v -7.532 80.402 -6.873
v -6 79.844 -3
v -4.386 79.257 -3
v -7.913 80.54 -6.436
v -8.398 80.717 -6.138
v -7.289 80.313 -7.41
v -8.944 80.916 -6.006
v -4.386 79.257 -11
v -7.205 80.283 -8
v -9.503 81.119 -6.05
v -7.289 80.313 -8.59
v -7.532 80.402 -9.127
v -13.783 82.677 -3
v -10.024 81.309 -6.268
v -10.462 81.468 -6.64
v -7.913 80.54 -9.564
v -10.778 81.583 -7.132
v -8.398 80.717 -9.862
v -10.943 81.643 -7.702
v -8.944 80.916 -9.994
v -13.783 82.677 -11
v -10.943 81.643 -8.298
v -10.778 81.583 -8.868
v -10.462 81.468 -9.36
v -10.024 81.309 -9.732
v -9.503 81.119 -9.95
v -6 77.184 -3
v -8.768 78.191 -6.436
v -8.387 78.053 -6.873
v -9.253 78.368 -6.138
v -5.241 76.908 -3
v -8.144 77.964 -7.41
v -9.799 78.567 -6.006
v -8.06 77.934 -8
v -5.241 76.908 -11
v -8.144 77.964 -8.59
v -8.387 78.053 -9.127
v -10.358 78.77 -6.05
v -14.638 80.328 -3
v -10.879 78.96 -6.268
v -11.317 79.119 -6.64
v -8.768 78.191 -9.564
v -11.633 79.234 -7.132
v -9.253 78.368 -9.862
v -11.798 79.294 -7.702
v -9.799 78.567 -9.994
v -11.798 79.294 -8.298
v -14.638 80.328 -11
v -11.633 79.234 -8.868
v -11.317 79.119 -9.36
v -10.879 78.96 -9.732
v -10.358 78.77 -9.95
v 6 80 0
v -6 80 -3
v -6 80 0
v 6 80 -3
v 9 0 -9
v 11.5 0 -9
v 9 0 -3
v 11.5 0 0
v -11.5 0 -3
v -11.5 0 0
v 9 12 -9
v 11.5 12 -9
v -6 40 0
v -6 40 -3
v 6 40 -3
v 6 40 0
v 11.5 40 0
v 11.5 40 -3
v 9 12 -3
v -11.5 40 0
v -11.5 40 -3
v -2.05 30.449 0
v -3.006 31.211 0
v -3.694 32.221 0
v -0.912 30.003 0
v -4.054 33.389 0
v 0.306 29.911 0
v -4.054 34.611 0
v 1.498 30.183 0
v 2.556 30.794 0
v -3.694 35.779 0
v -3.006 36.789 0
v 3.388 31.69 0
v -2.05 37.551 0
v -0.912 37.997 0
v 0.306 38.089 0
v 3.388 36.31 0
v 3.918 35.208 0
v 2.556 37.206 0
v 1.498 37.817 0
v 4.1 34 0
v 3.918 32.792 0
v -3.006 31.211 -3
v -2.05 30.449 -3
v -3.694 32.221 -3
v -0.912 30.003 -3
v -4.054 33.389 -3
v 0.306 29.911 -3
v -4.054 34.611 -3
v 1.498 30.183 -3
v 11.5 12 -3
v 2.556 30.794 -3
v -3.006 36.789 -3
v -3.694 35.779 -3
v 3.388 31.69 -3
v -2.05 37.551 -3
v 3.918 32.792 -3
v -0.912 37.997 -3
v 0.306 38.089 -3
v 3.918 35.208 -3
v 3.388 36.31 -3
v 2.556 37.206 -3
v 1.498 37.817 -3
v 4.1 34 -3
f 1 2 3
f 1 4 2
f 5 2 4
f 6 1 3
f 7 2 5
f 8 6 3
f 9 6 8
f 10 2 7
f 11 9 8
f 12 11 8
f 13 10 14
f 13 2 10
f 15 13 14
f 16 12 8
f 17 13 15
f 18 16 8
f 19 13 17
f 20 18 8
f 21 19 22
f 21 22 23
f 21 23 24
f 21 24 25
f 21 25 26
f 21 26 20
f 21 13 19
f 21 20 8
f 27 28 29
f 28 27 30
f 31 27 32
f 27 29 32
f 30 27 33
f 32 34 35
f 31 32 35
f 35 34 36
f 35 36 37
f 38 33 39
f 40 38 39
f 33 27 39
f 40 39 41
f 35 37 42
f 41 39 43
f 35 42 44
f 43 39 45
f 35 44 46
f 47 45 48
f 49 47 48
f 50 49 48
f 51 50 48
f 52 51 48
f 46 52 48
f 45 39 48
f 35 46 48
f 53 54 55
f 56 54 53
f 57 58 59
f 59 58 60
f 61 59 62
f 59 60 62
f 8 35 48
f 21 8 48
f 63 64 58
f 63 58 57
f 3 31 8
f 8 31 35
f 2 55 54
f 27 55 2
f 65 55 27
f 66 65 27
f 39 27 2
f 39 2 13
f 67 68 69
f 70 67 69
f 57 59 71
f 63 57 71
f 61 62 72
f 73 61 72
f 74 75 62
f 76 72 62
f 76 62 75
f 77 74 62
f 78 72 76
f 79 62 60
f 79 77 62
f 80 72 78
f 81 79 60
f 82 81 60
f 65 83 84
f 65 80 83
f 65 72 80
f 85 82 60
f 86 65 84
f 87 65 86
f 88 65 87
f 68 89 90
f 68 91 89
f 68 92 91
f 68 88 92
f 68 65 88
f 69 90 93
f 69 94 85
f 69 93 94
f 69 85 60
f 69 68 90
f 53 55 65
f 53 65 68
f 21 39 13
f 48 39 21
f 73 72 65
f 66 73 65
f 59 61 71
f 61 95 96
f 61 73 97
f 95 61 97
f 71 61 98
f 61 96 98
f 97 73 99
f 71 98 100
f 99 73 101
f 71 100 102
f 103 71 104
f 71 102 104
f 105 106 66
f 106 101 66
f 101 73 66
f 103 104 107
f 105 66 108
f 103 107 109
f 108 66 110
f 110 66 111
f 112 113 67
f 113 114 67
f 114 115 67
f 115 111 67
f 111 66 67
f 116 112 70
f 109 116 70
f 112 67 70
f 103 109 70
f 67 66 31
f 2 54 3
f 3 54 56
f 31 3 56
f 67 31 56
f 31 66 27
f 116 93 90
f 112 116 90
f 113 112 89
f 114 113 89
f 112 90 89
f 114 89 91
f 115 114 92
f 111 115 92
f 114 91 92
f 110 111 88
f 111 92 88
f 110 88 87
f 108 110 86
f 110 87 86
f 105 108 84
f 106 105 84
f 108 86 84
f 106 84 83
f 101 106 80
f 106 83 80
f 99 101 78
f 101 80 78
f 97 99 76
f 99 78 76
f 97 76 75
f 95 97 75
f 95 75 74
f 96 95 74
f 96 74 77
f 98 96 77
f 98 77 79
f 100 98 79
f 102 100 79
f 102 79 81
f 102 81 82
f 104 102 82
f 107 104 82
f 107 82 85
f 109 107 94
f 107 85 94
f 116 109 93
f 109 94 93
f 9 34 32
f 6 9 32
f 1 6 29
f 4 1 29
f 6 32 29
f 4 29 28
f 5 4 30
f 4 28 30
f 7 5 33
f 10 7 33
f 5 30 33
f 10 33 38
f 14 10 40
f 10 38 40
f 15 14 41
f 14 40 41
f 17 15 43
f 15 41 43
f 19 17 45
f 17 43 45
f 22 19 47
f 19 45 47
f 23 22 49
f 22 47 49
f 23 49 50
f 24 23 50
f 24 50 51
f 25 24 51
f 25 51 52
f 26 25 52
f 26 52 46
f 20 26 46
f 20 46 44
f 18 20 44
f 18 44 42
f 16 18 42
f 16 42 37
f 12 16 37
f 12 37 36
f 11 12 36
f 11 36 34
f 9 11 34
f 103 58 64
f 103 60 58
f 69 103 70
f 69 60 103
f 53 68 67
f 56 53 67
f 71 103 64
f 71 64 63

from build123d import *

# Parameters (mm, degrees)
SKETCH1_W           = 23
SKETCH1_H           = 40
BOSS_EXTRUDE1_DEPTH = 3
SKETCH2_R           = 4.1
CUT_EXTRUDE1_DEPTH  = 3
SKETCH3_W           = 12
SKETCH3_H           = 3
BOSS_EXTRUDE2_DEPTH = 40
SKETCH4_W           = 2.5
SKETCH4_H           = 12
BOSS_EXTRUDE3_DEPTH = 6
SKETCH6_W           = 8
SKETCH6_H           = 10
BOSS_EXTRUDE4_DEPTH = 2.5
SKETCH7_R           = 2
CUT_EXTRUDE2_DEPTH  = 78.511007161


with BuildPart() as part:
    # Sketch1 → Boss-Extrude1 (new body)
    with BuildSketch(Plane.XY):
        with Locations((0, 20)):
            Rectangle(SKETCH1_W, SKETCH1_H)
    extrude(amount=-BOSS_EXTRUDE1_DEPTH)

    # Sketch2 → Cut-Extrude1 (cut)
    with BuildSketch(Plane.XY):
        with Locations((0, 34)):
            Circle(SKETCH2_R)
    extrude(amount=-CUT_EXTRUDE1_DEPTH, mode=Mode.SUBTRACT)

    # Sketch3 → Boss-Extrude2 (add)
    with BuildSketch(Plane(origin=(0, 40, 0), x_dir=(1, 0, 0), z_dir=(0, 1, 0))):
        with Locations((0, 1.5)):
            Rectangle(SKETCH3_W, SKETCH3_H)
    extrude(amount=BOSS_EXTRUDE2_DEPTH)

    # Sketch4 → Boss-Extrude3 (add)
    with BuildSketch(Plane(origin=(0, 0, -3), x_dir=(-1, 0, 0), z_dir=(0, 0, -1))):
        with Locations((-10.25, 6)):
            Rectangle(SKETCH4_W, SKETCH4_H)
    extrude(amount=BOSS_EXTRUDE3_DEPTH)

    # Sketch6 → Boss-Extrude4 (add)
    with BuildSketch(Plane(origin=(24.104535363, 66.226666617, 0), x_dir=(0, 0, -1), z_dir=(0.34202014332566943, 0.9396926207859081, 0))):
        with Locations((7, 36.228956157)):
            Rectangle(SKETCH6_W, SKETCH6_H)
    extrude(amount=BOSS_EXTRUDE4_DEPTH)

    # Sketch7 → Cut-Extrude2 (cut, through all)
    with BuildSketch(Plane(origin=(24.104535363, 66.226666617, 0), x_dir=(0.9396926207859078, -0.3420201433256706, 0), z_dir=(-0.3420201433256706, -0.9396926207859078, 0))):
        with Locations((-36.228956157, -8)):
            Circle(SKETCH7_R)
    extrude(amount=-CUT_EXTRUDE2_DEPTH, mode=Mode.SUBTRACT)


solid = part.part
